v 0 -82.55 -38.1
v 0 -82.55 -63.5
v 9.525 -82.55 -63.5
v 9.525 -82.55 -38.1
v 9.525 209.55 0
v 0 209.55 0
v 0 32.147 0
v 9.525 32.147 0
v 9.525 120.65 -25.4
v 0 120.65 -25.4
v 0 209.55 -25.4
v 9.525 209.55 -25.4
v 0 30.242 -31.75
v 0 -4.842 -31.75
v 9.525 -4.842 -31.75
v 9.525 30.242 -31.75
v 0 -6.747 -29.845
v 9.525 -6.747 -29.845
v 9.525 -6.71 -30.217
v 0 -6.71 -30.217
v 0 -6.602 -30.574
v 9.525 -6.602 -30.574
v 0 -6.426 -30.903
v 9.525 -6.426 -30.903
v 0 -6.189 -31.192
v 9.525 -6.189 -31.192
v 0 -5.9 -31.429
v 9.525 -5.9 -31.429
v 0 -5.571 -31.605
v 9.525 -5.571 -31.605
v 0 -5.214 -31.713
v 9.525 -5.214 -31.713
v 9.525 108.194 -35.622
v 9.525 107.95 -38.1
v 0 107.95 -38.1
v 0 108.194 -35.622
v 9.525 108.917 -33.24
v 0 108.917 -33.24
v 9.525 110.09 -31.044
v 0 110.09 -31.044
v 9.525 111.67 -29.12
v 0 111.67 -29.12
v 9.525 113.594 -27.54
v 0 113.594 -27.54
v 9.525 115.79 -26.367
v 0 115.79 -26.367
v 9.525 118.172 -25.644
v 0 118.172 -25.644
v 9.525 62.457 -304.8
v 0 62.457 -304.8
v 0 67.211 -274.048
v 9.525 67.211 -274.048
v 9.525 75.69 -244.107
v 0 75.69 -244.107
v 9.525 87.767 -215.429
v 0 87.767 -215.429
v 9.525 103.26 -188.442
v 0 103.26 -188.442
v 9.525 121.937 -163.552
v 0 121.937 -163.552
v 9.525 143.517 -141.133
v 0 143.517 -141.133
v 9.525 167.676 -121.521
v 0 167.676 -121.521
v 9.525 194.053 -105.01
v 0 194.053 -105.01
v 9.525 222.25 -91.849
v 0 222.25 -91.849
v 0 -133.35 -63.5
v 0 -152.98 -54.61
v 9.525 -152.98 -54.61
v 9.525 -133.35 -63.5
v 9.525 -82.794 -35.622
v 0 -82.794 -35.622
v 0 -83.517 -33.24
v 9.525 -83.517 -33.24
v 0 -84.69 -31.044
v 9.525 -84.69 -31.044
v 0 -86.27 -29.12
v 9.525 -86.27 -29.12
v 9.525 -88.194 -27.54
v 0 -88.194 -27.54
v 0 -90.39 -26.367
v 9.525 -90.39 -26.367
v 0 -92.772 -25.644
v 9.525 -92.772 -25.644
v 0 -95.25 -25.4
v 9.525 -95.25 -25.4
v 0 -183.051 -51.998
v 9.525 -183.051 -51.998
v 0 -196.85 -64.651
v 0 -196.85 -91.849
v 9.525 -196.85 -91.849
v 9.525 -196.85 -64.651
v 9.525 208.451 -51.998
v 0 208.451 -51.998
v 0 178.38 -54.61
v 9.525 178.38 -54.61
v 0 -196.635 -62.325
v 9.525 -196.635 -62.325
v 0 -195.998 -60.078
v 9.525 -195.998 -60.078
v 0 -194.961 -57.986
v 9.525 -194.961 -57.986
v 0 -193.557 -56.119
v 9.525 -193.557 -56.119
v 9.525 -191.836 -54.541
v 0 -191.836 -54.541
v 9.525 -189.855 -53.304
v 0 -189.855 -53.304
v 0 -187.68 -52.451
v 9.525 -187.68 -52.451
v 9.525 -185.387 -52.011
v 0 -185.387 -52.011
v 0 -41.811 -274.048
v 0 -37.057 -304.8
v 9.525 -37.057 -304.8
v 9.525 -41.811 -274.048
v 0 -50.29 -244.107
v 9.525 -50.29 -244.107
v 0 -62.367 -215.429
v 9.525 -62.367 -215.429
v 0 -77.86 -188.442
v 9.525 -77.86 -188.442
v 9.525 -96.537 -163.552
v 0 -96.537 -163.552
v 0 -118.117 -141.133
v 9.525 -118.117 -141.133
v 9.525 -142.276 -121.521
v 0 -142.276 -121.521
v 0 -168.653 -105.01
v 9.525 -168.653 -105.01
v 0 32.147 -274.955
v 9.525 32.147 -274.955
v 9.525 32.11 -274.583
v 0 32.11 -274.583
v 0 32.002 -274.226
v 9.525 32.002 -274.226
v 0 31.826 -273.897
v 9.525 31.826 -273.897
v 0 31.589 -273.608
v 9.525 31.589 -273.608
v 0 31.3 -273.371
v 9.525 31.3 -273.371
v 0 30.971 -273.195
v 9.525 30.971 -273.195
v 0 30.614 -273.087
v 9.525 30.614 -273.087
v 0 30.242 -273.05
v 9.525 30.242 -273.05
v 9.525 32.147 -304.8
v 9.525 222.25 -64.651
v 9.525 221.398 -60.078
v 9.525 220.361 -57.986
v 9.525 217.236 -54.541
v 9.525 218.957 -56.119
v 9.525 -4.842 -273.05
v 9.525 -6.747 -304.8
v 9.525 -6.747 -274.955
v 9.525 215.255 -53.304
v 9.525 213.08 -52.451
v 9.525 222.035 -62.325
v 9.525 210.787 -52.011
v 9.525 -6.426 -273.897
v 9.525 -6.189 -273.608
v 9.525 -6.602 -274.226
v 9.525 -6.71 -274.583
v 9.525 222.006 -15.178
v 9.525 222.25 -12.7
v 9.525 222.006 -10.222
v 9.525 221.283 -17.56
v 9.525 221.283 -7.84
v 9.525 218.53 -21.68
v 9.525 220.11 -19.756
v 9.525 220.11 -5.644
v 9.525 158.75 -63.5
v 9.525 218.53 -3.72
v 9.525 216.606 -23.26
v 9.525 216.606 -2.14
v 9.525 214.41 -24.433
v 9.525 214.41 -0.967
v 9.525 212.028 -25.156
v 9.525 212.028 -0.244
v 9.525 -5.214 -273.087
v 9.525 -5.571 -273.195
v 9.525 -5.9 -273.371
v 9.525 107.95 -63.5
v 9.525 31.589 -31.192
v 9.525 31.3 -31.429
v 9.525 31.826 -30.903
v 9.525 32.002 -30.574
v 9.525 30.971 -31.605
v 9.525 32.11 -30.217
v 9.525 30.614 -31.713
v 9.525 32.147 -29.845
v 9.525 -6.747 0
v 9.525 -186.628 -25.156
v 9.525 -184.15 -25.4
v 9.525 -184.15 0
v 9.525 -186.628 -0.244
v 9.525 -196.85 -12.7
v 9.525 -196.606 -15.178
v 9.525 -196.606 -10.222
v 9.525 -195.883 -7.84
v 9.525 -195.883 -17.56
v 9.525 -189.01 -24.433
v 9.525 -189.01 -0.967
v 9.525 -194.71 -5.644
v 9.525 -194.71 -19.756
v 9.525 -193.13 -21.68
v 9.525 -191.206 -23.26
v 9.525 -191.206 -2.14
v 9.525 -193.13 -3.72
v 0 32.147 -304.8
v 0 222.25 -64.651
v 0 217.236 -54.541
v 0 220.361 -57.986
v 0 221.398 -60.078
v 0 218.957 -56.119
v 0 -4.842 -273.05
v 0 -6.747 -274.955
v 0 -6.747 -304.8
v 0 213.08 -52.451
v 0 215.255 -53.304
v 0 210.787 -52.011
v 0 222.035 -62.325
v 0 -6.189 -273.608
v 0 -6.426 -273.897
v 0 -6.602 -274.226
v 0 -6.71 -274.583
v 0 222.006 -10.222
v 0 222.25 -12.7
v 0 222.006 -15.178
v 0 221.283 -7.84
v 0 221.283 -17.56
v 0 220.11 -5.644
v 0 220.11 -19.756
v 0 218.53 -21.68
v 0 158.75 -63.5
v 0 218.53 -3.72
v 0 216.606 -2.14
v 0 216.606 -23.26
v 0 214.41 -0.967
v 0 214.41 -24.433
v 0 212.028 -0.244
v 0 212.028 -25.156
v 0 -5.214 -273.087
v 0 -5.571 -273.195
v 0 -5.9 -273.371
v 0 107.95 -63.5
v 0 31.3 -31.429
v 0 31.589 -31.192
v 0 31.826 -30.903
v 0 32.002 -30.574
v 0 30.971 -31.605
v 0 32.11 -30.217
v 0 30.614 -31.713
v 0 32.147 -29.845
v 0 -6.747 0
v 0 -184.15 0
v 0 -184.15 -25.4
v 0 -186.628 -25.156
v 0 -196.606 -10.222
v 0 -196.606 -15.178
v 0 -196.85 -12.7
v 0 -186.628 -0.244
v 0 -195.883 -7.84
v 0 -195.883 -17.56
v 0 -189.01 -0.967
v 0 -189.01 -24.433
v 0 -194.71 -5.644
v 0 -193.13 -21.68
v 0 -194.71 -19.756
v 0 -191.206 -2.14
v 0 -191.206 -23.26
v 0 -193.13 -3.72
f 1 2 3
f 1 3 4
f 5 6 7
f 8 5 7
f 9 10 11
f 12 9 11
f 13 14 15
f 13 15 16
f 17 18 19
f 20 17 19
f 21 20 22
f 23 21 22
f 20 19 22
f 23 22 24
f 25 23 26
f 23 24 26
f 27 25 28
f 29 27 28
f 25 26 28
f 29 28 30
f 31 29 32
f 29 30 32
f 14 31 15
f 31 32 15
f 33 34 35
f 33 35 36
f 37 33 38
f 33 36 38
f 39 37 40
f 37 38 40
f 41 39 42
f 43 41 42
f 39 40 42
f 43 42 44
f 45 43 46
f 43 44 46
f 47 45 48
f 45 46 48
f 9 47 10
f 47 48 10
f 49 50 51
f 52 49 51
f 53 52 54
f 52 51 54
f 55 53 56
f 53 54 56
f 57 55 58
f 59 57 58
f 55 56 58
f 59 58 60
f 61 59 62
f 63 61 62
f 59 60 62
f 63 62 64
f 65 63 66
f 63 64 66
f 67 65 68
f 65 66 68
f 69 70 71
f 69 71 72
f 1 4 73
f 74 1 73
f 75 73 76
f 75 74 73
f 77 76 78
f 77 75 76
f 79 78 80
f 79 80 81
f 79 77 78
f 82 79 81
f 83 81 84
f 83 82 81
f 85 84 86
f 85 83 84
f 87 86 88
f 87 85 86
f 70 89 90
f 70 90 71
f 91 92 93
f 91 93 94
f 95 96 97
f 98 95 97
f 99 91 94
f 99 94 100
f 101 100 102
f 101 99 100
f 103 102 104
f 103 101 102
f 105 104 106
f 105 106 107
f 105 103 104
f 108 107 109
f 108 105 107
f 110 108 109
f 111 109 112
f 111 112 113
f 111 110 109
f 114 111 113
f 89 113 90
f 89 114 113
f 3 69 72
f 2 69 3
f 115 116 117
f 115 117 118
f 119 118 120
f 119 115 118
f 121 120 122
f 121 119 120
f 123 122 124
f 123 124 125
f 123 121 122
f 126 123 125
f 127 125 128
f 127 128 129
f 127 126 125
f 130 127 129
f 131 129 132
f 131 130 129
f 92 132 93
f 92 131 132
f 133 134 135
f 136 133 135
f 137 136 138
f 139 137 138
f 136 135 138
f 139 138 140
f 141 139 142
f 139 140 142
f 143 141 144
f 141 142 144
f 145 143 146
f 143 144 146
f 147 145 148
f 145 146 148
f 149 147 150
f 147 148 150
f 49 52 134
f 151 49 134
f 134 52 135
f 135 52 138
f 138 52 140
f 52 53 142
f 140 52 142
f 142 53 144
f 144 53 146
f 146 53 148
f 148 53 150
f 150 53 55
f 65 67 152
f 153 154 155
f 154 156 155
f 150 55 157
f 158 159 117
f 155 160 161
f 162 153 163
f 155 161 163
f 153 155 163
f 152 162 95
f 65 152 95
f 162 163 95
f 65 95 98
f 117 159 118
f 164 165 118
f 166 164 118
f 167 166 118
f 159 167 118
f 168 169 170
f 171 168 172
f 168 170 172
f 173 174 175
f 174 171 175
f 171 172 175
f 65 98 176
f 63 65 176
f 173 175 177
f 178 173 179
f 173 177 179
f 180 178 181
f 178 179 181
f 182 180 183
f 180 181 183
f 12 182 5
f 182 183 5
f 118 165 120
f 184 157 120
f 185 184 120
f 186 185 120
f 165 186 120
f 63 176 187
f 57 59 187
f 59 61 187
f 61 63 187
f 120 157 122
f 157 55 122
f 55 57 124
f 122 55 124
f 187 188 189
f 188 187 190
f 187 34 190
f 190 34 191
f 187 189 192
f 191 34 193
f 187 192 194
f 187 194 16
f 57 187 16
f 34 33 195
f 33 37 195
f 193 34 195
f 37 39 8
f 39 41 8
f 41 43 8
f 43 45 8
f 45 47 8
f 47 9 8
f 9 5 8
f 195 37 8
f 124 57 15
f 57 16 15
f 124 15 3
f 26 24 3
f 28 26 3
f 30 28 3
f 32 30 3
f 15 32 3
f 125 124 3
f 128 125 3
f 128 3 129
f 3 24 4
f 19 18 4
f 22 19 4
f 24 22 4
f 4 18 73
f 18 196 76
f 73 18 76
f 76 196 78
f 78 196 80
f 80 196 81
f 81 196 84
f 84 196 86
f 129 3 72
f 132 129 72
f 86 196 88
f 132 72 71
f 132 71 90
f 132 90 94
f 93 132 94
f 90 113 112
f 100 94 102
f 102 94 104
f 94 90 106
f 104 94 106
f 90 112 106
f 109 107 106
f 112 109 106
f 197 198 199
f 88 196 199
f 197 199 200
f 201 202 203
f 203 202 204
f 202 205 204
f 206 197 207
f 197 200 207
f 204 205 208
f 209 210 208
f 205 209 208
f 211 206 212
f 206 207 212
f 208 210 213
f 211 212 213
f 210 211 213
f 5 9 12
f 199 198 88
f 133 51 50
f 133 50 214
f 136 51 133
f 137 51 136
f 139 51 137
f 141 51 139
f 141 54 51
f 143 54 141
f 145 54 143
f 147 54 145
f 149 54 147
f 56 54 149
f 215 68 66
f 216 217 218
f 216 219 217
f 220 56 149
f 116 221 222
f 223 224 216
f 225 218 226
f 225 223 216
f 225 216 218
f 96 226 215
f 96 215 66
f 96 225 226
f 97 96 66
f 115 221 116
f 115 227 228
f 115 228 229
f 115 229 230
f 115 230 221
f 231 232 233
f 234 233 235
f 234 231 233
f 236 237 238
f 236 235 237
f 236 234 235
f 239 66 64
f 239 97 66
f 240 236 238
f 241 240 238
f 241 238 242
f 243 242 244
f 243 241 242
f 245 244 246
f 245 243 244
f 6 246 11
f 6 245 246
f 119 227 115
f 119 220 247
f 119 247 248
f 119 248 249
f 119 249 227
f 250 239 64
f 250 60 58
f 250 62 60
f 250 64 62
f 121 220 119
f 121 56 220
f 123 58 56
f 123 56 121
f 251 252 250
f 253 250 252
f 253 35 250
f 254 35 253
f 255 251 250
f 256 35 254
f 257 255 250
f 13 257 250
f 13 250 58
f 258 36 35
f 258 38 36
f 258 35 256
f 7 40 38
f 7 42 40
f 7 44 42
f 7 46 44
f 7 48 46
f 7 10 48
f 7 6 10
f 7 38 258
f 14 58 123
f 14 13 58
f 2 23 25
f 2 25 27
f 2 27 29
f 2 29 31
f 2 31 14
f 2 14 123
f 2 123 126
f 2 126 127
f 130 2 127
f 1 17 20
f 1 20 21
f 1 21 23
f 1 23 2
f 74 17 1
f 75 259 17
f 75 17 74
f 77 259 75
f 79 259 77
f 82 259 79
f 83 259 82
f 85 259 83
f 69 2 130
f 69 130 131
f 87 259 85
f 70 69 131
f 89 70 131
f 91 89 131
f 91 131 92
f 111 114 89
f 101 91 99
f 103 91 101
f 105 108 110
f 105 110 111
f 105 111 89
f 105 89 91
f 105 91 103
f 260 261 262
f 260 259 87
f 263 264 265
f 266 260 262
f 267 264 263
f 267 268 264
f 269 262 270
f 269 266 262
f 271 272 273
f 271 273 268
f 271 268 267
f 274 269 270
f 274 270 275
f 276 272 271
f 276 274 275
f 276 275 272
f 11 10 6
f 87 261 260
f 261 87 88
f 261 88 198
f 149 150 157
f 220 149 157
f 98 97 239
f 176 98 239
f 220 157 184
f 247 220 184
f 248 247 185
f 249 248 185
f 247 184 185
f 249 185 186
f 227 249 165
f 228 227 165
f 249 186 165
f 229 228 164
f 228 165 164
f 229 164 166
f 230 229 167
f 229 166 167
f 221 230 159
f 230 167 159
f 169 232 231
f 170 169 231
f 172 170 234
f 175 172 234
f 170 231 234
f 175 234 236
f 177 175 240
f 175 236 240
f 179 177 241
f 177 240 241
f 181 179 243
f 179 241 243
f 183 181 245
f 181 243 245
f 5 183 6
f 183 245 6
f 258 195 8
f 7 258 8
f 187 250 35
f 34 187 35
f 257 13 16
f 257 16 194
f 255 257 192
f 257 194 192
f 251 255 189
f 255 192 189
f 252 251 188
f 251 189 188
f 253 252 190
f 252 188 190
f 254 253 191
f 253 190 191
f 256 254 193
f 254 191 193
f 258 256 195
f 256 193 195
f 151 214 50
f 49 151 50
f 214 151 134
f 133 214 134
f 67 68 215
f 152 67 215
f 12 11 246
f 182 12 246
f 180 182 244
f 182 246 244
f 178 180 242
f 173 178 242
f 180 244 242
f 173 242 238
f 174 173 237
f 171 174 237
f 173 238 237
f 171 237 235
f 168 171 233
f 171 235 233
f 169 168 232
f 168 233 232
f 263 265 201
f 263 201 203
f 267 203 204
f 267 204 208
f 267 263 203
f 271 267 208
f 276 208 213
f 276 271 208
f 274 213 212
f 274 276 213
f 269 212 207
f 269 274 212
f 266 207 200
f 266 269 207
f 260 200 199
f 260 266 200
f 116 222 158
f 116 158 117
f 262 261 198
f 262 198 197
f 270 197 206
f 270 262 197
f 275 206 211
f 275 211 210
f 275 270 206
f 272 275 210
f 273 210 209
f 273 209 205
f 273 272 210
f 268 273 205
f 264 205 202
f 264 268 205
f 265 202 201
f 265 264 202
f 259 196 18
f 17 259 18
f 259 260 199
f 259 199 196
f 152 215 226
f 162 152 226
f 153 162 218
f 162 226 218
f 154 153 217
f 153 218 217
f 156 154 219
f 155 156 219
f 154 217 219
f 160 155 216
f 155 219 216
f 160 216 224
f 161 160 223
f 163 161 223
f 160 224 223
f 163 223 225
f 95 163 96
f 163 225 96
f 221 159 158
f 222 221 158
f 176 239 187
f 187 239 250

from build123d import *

# Parameters (mm, degrees)
F1_DEPTH = 9.525
F2_W     = 12.7
F2_H     = 241.3
F3_DEPTH = 25.4
F6_DEPTH = 25.4


with BuildPart() as f1:
    # F0 (on Right) → F1 (new body)
    with BuildSketch(Plane.YZ):
        with BuildLine():
            Line((29.845, -31.75), (0, -31.75))
            Line((0, -31.75), (0, -273.05))
            Line((0, -273.05), (29.845, -273.05))
            ThreePointArc((29.845, -273.05), (31.192038, -273.607962), (31.75, -274.955))
            Line((31.75, -274.955), (31.75, -304.8))
            Line((31.75, -304.8), (62.456746, -304.8))
            ThreePointArc((62.456746, -304.8), (112.216851, -175.710639), (222.25, -91.848627))
            Line((222.25, -91.848627), (222.25, -64.650771))
            ThreePointArc((222.25, -64.650771), (218.132973, -55.290078), (208.45117, -51.998397))
            Line((208.45117, -51.998397), (178.380117, -54.61))
            Line((178.380117, -54.61), (158.75, -63.5))
            Line((158.75, -63.5), (107.95, -63.5))
            Line((107.95, -63.5), (107.95, -38.1))
            ThreePointArc((107.95, -38.1), (111.669744, -29.119744), (120.65, -25.4))
            Line((120.65, -25.4), (209.55, -25.4))
            ThreePointArc((209.55, -25.4), (218.530256, -21.680256), (222.25, -12.7))
            ThreePointArc((222.25, -12.7), (218.530256, -3.719744), (209.55, 0))
            Line((209.55, 0), (31.75, 0))
            Line((31.75, 0), (31.75, -29.845))
            ThreePointArc((31.75, -29.845), (31.192038, -31.192038), (29.845, -31.75))
        make_face()
    extrude(amount=F1_DEPTH)

    # F2 (on face) → F3 (cut)
    with BuildSketch(Plane.YZ.offset(9.525)):
        with Locations((6.35, -152.4)):
            Rectangle(F2_W, F2_H)
    extrude(amount=-F3_DEPTH, mode=Mode.SUBTRACT)

    # F4: F1 across face


with BuildPart() as f1_1:
    add(f1.part)
    add(f1.part.mirror(Plane(origin=(4.7625, 12.7, -152.4), x_dir=(1, 0, 0), z_dir=(0, -1, 0))))

    # F5 (on face) → F6 (cut)
    with BuildSketch(Plane.YZ.offset(9.525)):
        with BuildLine():
            Line((32.146875, 0), (-6.746875, 0))
            Line((-6.746875, 0), (-6.746875, -29.845))
            ThreePointArc((-6.746875, -29.845), (-6.188913, -31.192038), (-4.841875, -31.75))
            Line((-4.841875, -31.75), (30.241875, -31.75))
            ThreePointArc((30.241875, -31.75), (31.588913, -31.192038), (32.146875, -29.845))
            Line((32.146875, -29.845), (32.146875, 0))
        make_face()
        with BuildLine():
            Line((-6.746875, -274.955), (-6.746875, -304.8))
            Line((-6.746875, -304.8), (32.146875, -304.8))
            Line((32.146875, -304.8), (32.146875, -274.955))
            ThreePointArc((32.146875, -274.955), (31.588913, -273.607962), (30.241875, -273.05))
            Line((30.241875, -273.05), (-4.841875, -273.05))
            ThreePointArc((-4.841875, -273.05), (-6.188913, -273.607962), (-6.746875, -274.955))
        make_face()
    extrude(amount=-F6_DEPTH, mode=Mode.SUBTRACT)


solid = f1_1.part
